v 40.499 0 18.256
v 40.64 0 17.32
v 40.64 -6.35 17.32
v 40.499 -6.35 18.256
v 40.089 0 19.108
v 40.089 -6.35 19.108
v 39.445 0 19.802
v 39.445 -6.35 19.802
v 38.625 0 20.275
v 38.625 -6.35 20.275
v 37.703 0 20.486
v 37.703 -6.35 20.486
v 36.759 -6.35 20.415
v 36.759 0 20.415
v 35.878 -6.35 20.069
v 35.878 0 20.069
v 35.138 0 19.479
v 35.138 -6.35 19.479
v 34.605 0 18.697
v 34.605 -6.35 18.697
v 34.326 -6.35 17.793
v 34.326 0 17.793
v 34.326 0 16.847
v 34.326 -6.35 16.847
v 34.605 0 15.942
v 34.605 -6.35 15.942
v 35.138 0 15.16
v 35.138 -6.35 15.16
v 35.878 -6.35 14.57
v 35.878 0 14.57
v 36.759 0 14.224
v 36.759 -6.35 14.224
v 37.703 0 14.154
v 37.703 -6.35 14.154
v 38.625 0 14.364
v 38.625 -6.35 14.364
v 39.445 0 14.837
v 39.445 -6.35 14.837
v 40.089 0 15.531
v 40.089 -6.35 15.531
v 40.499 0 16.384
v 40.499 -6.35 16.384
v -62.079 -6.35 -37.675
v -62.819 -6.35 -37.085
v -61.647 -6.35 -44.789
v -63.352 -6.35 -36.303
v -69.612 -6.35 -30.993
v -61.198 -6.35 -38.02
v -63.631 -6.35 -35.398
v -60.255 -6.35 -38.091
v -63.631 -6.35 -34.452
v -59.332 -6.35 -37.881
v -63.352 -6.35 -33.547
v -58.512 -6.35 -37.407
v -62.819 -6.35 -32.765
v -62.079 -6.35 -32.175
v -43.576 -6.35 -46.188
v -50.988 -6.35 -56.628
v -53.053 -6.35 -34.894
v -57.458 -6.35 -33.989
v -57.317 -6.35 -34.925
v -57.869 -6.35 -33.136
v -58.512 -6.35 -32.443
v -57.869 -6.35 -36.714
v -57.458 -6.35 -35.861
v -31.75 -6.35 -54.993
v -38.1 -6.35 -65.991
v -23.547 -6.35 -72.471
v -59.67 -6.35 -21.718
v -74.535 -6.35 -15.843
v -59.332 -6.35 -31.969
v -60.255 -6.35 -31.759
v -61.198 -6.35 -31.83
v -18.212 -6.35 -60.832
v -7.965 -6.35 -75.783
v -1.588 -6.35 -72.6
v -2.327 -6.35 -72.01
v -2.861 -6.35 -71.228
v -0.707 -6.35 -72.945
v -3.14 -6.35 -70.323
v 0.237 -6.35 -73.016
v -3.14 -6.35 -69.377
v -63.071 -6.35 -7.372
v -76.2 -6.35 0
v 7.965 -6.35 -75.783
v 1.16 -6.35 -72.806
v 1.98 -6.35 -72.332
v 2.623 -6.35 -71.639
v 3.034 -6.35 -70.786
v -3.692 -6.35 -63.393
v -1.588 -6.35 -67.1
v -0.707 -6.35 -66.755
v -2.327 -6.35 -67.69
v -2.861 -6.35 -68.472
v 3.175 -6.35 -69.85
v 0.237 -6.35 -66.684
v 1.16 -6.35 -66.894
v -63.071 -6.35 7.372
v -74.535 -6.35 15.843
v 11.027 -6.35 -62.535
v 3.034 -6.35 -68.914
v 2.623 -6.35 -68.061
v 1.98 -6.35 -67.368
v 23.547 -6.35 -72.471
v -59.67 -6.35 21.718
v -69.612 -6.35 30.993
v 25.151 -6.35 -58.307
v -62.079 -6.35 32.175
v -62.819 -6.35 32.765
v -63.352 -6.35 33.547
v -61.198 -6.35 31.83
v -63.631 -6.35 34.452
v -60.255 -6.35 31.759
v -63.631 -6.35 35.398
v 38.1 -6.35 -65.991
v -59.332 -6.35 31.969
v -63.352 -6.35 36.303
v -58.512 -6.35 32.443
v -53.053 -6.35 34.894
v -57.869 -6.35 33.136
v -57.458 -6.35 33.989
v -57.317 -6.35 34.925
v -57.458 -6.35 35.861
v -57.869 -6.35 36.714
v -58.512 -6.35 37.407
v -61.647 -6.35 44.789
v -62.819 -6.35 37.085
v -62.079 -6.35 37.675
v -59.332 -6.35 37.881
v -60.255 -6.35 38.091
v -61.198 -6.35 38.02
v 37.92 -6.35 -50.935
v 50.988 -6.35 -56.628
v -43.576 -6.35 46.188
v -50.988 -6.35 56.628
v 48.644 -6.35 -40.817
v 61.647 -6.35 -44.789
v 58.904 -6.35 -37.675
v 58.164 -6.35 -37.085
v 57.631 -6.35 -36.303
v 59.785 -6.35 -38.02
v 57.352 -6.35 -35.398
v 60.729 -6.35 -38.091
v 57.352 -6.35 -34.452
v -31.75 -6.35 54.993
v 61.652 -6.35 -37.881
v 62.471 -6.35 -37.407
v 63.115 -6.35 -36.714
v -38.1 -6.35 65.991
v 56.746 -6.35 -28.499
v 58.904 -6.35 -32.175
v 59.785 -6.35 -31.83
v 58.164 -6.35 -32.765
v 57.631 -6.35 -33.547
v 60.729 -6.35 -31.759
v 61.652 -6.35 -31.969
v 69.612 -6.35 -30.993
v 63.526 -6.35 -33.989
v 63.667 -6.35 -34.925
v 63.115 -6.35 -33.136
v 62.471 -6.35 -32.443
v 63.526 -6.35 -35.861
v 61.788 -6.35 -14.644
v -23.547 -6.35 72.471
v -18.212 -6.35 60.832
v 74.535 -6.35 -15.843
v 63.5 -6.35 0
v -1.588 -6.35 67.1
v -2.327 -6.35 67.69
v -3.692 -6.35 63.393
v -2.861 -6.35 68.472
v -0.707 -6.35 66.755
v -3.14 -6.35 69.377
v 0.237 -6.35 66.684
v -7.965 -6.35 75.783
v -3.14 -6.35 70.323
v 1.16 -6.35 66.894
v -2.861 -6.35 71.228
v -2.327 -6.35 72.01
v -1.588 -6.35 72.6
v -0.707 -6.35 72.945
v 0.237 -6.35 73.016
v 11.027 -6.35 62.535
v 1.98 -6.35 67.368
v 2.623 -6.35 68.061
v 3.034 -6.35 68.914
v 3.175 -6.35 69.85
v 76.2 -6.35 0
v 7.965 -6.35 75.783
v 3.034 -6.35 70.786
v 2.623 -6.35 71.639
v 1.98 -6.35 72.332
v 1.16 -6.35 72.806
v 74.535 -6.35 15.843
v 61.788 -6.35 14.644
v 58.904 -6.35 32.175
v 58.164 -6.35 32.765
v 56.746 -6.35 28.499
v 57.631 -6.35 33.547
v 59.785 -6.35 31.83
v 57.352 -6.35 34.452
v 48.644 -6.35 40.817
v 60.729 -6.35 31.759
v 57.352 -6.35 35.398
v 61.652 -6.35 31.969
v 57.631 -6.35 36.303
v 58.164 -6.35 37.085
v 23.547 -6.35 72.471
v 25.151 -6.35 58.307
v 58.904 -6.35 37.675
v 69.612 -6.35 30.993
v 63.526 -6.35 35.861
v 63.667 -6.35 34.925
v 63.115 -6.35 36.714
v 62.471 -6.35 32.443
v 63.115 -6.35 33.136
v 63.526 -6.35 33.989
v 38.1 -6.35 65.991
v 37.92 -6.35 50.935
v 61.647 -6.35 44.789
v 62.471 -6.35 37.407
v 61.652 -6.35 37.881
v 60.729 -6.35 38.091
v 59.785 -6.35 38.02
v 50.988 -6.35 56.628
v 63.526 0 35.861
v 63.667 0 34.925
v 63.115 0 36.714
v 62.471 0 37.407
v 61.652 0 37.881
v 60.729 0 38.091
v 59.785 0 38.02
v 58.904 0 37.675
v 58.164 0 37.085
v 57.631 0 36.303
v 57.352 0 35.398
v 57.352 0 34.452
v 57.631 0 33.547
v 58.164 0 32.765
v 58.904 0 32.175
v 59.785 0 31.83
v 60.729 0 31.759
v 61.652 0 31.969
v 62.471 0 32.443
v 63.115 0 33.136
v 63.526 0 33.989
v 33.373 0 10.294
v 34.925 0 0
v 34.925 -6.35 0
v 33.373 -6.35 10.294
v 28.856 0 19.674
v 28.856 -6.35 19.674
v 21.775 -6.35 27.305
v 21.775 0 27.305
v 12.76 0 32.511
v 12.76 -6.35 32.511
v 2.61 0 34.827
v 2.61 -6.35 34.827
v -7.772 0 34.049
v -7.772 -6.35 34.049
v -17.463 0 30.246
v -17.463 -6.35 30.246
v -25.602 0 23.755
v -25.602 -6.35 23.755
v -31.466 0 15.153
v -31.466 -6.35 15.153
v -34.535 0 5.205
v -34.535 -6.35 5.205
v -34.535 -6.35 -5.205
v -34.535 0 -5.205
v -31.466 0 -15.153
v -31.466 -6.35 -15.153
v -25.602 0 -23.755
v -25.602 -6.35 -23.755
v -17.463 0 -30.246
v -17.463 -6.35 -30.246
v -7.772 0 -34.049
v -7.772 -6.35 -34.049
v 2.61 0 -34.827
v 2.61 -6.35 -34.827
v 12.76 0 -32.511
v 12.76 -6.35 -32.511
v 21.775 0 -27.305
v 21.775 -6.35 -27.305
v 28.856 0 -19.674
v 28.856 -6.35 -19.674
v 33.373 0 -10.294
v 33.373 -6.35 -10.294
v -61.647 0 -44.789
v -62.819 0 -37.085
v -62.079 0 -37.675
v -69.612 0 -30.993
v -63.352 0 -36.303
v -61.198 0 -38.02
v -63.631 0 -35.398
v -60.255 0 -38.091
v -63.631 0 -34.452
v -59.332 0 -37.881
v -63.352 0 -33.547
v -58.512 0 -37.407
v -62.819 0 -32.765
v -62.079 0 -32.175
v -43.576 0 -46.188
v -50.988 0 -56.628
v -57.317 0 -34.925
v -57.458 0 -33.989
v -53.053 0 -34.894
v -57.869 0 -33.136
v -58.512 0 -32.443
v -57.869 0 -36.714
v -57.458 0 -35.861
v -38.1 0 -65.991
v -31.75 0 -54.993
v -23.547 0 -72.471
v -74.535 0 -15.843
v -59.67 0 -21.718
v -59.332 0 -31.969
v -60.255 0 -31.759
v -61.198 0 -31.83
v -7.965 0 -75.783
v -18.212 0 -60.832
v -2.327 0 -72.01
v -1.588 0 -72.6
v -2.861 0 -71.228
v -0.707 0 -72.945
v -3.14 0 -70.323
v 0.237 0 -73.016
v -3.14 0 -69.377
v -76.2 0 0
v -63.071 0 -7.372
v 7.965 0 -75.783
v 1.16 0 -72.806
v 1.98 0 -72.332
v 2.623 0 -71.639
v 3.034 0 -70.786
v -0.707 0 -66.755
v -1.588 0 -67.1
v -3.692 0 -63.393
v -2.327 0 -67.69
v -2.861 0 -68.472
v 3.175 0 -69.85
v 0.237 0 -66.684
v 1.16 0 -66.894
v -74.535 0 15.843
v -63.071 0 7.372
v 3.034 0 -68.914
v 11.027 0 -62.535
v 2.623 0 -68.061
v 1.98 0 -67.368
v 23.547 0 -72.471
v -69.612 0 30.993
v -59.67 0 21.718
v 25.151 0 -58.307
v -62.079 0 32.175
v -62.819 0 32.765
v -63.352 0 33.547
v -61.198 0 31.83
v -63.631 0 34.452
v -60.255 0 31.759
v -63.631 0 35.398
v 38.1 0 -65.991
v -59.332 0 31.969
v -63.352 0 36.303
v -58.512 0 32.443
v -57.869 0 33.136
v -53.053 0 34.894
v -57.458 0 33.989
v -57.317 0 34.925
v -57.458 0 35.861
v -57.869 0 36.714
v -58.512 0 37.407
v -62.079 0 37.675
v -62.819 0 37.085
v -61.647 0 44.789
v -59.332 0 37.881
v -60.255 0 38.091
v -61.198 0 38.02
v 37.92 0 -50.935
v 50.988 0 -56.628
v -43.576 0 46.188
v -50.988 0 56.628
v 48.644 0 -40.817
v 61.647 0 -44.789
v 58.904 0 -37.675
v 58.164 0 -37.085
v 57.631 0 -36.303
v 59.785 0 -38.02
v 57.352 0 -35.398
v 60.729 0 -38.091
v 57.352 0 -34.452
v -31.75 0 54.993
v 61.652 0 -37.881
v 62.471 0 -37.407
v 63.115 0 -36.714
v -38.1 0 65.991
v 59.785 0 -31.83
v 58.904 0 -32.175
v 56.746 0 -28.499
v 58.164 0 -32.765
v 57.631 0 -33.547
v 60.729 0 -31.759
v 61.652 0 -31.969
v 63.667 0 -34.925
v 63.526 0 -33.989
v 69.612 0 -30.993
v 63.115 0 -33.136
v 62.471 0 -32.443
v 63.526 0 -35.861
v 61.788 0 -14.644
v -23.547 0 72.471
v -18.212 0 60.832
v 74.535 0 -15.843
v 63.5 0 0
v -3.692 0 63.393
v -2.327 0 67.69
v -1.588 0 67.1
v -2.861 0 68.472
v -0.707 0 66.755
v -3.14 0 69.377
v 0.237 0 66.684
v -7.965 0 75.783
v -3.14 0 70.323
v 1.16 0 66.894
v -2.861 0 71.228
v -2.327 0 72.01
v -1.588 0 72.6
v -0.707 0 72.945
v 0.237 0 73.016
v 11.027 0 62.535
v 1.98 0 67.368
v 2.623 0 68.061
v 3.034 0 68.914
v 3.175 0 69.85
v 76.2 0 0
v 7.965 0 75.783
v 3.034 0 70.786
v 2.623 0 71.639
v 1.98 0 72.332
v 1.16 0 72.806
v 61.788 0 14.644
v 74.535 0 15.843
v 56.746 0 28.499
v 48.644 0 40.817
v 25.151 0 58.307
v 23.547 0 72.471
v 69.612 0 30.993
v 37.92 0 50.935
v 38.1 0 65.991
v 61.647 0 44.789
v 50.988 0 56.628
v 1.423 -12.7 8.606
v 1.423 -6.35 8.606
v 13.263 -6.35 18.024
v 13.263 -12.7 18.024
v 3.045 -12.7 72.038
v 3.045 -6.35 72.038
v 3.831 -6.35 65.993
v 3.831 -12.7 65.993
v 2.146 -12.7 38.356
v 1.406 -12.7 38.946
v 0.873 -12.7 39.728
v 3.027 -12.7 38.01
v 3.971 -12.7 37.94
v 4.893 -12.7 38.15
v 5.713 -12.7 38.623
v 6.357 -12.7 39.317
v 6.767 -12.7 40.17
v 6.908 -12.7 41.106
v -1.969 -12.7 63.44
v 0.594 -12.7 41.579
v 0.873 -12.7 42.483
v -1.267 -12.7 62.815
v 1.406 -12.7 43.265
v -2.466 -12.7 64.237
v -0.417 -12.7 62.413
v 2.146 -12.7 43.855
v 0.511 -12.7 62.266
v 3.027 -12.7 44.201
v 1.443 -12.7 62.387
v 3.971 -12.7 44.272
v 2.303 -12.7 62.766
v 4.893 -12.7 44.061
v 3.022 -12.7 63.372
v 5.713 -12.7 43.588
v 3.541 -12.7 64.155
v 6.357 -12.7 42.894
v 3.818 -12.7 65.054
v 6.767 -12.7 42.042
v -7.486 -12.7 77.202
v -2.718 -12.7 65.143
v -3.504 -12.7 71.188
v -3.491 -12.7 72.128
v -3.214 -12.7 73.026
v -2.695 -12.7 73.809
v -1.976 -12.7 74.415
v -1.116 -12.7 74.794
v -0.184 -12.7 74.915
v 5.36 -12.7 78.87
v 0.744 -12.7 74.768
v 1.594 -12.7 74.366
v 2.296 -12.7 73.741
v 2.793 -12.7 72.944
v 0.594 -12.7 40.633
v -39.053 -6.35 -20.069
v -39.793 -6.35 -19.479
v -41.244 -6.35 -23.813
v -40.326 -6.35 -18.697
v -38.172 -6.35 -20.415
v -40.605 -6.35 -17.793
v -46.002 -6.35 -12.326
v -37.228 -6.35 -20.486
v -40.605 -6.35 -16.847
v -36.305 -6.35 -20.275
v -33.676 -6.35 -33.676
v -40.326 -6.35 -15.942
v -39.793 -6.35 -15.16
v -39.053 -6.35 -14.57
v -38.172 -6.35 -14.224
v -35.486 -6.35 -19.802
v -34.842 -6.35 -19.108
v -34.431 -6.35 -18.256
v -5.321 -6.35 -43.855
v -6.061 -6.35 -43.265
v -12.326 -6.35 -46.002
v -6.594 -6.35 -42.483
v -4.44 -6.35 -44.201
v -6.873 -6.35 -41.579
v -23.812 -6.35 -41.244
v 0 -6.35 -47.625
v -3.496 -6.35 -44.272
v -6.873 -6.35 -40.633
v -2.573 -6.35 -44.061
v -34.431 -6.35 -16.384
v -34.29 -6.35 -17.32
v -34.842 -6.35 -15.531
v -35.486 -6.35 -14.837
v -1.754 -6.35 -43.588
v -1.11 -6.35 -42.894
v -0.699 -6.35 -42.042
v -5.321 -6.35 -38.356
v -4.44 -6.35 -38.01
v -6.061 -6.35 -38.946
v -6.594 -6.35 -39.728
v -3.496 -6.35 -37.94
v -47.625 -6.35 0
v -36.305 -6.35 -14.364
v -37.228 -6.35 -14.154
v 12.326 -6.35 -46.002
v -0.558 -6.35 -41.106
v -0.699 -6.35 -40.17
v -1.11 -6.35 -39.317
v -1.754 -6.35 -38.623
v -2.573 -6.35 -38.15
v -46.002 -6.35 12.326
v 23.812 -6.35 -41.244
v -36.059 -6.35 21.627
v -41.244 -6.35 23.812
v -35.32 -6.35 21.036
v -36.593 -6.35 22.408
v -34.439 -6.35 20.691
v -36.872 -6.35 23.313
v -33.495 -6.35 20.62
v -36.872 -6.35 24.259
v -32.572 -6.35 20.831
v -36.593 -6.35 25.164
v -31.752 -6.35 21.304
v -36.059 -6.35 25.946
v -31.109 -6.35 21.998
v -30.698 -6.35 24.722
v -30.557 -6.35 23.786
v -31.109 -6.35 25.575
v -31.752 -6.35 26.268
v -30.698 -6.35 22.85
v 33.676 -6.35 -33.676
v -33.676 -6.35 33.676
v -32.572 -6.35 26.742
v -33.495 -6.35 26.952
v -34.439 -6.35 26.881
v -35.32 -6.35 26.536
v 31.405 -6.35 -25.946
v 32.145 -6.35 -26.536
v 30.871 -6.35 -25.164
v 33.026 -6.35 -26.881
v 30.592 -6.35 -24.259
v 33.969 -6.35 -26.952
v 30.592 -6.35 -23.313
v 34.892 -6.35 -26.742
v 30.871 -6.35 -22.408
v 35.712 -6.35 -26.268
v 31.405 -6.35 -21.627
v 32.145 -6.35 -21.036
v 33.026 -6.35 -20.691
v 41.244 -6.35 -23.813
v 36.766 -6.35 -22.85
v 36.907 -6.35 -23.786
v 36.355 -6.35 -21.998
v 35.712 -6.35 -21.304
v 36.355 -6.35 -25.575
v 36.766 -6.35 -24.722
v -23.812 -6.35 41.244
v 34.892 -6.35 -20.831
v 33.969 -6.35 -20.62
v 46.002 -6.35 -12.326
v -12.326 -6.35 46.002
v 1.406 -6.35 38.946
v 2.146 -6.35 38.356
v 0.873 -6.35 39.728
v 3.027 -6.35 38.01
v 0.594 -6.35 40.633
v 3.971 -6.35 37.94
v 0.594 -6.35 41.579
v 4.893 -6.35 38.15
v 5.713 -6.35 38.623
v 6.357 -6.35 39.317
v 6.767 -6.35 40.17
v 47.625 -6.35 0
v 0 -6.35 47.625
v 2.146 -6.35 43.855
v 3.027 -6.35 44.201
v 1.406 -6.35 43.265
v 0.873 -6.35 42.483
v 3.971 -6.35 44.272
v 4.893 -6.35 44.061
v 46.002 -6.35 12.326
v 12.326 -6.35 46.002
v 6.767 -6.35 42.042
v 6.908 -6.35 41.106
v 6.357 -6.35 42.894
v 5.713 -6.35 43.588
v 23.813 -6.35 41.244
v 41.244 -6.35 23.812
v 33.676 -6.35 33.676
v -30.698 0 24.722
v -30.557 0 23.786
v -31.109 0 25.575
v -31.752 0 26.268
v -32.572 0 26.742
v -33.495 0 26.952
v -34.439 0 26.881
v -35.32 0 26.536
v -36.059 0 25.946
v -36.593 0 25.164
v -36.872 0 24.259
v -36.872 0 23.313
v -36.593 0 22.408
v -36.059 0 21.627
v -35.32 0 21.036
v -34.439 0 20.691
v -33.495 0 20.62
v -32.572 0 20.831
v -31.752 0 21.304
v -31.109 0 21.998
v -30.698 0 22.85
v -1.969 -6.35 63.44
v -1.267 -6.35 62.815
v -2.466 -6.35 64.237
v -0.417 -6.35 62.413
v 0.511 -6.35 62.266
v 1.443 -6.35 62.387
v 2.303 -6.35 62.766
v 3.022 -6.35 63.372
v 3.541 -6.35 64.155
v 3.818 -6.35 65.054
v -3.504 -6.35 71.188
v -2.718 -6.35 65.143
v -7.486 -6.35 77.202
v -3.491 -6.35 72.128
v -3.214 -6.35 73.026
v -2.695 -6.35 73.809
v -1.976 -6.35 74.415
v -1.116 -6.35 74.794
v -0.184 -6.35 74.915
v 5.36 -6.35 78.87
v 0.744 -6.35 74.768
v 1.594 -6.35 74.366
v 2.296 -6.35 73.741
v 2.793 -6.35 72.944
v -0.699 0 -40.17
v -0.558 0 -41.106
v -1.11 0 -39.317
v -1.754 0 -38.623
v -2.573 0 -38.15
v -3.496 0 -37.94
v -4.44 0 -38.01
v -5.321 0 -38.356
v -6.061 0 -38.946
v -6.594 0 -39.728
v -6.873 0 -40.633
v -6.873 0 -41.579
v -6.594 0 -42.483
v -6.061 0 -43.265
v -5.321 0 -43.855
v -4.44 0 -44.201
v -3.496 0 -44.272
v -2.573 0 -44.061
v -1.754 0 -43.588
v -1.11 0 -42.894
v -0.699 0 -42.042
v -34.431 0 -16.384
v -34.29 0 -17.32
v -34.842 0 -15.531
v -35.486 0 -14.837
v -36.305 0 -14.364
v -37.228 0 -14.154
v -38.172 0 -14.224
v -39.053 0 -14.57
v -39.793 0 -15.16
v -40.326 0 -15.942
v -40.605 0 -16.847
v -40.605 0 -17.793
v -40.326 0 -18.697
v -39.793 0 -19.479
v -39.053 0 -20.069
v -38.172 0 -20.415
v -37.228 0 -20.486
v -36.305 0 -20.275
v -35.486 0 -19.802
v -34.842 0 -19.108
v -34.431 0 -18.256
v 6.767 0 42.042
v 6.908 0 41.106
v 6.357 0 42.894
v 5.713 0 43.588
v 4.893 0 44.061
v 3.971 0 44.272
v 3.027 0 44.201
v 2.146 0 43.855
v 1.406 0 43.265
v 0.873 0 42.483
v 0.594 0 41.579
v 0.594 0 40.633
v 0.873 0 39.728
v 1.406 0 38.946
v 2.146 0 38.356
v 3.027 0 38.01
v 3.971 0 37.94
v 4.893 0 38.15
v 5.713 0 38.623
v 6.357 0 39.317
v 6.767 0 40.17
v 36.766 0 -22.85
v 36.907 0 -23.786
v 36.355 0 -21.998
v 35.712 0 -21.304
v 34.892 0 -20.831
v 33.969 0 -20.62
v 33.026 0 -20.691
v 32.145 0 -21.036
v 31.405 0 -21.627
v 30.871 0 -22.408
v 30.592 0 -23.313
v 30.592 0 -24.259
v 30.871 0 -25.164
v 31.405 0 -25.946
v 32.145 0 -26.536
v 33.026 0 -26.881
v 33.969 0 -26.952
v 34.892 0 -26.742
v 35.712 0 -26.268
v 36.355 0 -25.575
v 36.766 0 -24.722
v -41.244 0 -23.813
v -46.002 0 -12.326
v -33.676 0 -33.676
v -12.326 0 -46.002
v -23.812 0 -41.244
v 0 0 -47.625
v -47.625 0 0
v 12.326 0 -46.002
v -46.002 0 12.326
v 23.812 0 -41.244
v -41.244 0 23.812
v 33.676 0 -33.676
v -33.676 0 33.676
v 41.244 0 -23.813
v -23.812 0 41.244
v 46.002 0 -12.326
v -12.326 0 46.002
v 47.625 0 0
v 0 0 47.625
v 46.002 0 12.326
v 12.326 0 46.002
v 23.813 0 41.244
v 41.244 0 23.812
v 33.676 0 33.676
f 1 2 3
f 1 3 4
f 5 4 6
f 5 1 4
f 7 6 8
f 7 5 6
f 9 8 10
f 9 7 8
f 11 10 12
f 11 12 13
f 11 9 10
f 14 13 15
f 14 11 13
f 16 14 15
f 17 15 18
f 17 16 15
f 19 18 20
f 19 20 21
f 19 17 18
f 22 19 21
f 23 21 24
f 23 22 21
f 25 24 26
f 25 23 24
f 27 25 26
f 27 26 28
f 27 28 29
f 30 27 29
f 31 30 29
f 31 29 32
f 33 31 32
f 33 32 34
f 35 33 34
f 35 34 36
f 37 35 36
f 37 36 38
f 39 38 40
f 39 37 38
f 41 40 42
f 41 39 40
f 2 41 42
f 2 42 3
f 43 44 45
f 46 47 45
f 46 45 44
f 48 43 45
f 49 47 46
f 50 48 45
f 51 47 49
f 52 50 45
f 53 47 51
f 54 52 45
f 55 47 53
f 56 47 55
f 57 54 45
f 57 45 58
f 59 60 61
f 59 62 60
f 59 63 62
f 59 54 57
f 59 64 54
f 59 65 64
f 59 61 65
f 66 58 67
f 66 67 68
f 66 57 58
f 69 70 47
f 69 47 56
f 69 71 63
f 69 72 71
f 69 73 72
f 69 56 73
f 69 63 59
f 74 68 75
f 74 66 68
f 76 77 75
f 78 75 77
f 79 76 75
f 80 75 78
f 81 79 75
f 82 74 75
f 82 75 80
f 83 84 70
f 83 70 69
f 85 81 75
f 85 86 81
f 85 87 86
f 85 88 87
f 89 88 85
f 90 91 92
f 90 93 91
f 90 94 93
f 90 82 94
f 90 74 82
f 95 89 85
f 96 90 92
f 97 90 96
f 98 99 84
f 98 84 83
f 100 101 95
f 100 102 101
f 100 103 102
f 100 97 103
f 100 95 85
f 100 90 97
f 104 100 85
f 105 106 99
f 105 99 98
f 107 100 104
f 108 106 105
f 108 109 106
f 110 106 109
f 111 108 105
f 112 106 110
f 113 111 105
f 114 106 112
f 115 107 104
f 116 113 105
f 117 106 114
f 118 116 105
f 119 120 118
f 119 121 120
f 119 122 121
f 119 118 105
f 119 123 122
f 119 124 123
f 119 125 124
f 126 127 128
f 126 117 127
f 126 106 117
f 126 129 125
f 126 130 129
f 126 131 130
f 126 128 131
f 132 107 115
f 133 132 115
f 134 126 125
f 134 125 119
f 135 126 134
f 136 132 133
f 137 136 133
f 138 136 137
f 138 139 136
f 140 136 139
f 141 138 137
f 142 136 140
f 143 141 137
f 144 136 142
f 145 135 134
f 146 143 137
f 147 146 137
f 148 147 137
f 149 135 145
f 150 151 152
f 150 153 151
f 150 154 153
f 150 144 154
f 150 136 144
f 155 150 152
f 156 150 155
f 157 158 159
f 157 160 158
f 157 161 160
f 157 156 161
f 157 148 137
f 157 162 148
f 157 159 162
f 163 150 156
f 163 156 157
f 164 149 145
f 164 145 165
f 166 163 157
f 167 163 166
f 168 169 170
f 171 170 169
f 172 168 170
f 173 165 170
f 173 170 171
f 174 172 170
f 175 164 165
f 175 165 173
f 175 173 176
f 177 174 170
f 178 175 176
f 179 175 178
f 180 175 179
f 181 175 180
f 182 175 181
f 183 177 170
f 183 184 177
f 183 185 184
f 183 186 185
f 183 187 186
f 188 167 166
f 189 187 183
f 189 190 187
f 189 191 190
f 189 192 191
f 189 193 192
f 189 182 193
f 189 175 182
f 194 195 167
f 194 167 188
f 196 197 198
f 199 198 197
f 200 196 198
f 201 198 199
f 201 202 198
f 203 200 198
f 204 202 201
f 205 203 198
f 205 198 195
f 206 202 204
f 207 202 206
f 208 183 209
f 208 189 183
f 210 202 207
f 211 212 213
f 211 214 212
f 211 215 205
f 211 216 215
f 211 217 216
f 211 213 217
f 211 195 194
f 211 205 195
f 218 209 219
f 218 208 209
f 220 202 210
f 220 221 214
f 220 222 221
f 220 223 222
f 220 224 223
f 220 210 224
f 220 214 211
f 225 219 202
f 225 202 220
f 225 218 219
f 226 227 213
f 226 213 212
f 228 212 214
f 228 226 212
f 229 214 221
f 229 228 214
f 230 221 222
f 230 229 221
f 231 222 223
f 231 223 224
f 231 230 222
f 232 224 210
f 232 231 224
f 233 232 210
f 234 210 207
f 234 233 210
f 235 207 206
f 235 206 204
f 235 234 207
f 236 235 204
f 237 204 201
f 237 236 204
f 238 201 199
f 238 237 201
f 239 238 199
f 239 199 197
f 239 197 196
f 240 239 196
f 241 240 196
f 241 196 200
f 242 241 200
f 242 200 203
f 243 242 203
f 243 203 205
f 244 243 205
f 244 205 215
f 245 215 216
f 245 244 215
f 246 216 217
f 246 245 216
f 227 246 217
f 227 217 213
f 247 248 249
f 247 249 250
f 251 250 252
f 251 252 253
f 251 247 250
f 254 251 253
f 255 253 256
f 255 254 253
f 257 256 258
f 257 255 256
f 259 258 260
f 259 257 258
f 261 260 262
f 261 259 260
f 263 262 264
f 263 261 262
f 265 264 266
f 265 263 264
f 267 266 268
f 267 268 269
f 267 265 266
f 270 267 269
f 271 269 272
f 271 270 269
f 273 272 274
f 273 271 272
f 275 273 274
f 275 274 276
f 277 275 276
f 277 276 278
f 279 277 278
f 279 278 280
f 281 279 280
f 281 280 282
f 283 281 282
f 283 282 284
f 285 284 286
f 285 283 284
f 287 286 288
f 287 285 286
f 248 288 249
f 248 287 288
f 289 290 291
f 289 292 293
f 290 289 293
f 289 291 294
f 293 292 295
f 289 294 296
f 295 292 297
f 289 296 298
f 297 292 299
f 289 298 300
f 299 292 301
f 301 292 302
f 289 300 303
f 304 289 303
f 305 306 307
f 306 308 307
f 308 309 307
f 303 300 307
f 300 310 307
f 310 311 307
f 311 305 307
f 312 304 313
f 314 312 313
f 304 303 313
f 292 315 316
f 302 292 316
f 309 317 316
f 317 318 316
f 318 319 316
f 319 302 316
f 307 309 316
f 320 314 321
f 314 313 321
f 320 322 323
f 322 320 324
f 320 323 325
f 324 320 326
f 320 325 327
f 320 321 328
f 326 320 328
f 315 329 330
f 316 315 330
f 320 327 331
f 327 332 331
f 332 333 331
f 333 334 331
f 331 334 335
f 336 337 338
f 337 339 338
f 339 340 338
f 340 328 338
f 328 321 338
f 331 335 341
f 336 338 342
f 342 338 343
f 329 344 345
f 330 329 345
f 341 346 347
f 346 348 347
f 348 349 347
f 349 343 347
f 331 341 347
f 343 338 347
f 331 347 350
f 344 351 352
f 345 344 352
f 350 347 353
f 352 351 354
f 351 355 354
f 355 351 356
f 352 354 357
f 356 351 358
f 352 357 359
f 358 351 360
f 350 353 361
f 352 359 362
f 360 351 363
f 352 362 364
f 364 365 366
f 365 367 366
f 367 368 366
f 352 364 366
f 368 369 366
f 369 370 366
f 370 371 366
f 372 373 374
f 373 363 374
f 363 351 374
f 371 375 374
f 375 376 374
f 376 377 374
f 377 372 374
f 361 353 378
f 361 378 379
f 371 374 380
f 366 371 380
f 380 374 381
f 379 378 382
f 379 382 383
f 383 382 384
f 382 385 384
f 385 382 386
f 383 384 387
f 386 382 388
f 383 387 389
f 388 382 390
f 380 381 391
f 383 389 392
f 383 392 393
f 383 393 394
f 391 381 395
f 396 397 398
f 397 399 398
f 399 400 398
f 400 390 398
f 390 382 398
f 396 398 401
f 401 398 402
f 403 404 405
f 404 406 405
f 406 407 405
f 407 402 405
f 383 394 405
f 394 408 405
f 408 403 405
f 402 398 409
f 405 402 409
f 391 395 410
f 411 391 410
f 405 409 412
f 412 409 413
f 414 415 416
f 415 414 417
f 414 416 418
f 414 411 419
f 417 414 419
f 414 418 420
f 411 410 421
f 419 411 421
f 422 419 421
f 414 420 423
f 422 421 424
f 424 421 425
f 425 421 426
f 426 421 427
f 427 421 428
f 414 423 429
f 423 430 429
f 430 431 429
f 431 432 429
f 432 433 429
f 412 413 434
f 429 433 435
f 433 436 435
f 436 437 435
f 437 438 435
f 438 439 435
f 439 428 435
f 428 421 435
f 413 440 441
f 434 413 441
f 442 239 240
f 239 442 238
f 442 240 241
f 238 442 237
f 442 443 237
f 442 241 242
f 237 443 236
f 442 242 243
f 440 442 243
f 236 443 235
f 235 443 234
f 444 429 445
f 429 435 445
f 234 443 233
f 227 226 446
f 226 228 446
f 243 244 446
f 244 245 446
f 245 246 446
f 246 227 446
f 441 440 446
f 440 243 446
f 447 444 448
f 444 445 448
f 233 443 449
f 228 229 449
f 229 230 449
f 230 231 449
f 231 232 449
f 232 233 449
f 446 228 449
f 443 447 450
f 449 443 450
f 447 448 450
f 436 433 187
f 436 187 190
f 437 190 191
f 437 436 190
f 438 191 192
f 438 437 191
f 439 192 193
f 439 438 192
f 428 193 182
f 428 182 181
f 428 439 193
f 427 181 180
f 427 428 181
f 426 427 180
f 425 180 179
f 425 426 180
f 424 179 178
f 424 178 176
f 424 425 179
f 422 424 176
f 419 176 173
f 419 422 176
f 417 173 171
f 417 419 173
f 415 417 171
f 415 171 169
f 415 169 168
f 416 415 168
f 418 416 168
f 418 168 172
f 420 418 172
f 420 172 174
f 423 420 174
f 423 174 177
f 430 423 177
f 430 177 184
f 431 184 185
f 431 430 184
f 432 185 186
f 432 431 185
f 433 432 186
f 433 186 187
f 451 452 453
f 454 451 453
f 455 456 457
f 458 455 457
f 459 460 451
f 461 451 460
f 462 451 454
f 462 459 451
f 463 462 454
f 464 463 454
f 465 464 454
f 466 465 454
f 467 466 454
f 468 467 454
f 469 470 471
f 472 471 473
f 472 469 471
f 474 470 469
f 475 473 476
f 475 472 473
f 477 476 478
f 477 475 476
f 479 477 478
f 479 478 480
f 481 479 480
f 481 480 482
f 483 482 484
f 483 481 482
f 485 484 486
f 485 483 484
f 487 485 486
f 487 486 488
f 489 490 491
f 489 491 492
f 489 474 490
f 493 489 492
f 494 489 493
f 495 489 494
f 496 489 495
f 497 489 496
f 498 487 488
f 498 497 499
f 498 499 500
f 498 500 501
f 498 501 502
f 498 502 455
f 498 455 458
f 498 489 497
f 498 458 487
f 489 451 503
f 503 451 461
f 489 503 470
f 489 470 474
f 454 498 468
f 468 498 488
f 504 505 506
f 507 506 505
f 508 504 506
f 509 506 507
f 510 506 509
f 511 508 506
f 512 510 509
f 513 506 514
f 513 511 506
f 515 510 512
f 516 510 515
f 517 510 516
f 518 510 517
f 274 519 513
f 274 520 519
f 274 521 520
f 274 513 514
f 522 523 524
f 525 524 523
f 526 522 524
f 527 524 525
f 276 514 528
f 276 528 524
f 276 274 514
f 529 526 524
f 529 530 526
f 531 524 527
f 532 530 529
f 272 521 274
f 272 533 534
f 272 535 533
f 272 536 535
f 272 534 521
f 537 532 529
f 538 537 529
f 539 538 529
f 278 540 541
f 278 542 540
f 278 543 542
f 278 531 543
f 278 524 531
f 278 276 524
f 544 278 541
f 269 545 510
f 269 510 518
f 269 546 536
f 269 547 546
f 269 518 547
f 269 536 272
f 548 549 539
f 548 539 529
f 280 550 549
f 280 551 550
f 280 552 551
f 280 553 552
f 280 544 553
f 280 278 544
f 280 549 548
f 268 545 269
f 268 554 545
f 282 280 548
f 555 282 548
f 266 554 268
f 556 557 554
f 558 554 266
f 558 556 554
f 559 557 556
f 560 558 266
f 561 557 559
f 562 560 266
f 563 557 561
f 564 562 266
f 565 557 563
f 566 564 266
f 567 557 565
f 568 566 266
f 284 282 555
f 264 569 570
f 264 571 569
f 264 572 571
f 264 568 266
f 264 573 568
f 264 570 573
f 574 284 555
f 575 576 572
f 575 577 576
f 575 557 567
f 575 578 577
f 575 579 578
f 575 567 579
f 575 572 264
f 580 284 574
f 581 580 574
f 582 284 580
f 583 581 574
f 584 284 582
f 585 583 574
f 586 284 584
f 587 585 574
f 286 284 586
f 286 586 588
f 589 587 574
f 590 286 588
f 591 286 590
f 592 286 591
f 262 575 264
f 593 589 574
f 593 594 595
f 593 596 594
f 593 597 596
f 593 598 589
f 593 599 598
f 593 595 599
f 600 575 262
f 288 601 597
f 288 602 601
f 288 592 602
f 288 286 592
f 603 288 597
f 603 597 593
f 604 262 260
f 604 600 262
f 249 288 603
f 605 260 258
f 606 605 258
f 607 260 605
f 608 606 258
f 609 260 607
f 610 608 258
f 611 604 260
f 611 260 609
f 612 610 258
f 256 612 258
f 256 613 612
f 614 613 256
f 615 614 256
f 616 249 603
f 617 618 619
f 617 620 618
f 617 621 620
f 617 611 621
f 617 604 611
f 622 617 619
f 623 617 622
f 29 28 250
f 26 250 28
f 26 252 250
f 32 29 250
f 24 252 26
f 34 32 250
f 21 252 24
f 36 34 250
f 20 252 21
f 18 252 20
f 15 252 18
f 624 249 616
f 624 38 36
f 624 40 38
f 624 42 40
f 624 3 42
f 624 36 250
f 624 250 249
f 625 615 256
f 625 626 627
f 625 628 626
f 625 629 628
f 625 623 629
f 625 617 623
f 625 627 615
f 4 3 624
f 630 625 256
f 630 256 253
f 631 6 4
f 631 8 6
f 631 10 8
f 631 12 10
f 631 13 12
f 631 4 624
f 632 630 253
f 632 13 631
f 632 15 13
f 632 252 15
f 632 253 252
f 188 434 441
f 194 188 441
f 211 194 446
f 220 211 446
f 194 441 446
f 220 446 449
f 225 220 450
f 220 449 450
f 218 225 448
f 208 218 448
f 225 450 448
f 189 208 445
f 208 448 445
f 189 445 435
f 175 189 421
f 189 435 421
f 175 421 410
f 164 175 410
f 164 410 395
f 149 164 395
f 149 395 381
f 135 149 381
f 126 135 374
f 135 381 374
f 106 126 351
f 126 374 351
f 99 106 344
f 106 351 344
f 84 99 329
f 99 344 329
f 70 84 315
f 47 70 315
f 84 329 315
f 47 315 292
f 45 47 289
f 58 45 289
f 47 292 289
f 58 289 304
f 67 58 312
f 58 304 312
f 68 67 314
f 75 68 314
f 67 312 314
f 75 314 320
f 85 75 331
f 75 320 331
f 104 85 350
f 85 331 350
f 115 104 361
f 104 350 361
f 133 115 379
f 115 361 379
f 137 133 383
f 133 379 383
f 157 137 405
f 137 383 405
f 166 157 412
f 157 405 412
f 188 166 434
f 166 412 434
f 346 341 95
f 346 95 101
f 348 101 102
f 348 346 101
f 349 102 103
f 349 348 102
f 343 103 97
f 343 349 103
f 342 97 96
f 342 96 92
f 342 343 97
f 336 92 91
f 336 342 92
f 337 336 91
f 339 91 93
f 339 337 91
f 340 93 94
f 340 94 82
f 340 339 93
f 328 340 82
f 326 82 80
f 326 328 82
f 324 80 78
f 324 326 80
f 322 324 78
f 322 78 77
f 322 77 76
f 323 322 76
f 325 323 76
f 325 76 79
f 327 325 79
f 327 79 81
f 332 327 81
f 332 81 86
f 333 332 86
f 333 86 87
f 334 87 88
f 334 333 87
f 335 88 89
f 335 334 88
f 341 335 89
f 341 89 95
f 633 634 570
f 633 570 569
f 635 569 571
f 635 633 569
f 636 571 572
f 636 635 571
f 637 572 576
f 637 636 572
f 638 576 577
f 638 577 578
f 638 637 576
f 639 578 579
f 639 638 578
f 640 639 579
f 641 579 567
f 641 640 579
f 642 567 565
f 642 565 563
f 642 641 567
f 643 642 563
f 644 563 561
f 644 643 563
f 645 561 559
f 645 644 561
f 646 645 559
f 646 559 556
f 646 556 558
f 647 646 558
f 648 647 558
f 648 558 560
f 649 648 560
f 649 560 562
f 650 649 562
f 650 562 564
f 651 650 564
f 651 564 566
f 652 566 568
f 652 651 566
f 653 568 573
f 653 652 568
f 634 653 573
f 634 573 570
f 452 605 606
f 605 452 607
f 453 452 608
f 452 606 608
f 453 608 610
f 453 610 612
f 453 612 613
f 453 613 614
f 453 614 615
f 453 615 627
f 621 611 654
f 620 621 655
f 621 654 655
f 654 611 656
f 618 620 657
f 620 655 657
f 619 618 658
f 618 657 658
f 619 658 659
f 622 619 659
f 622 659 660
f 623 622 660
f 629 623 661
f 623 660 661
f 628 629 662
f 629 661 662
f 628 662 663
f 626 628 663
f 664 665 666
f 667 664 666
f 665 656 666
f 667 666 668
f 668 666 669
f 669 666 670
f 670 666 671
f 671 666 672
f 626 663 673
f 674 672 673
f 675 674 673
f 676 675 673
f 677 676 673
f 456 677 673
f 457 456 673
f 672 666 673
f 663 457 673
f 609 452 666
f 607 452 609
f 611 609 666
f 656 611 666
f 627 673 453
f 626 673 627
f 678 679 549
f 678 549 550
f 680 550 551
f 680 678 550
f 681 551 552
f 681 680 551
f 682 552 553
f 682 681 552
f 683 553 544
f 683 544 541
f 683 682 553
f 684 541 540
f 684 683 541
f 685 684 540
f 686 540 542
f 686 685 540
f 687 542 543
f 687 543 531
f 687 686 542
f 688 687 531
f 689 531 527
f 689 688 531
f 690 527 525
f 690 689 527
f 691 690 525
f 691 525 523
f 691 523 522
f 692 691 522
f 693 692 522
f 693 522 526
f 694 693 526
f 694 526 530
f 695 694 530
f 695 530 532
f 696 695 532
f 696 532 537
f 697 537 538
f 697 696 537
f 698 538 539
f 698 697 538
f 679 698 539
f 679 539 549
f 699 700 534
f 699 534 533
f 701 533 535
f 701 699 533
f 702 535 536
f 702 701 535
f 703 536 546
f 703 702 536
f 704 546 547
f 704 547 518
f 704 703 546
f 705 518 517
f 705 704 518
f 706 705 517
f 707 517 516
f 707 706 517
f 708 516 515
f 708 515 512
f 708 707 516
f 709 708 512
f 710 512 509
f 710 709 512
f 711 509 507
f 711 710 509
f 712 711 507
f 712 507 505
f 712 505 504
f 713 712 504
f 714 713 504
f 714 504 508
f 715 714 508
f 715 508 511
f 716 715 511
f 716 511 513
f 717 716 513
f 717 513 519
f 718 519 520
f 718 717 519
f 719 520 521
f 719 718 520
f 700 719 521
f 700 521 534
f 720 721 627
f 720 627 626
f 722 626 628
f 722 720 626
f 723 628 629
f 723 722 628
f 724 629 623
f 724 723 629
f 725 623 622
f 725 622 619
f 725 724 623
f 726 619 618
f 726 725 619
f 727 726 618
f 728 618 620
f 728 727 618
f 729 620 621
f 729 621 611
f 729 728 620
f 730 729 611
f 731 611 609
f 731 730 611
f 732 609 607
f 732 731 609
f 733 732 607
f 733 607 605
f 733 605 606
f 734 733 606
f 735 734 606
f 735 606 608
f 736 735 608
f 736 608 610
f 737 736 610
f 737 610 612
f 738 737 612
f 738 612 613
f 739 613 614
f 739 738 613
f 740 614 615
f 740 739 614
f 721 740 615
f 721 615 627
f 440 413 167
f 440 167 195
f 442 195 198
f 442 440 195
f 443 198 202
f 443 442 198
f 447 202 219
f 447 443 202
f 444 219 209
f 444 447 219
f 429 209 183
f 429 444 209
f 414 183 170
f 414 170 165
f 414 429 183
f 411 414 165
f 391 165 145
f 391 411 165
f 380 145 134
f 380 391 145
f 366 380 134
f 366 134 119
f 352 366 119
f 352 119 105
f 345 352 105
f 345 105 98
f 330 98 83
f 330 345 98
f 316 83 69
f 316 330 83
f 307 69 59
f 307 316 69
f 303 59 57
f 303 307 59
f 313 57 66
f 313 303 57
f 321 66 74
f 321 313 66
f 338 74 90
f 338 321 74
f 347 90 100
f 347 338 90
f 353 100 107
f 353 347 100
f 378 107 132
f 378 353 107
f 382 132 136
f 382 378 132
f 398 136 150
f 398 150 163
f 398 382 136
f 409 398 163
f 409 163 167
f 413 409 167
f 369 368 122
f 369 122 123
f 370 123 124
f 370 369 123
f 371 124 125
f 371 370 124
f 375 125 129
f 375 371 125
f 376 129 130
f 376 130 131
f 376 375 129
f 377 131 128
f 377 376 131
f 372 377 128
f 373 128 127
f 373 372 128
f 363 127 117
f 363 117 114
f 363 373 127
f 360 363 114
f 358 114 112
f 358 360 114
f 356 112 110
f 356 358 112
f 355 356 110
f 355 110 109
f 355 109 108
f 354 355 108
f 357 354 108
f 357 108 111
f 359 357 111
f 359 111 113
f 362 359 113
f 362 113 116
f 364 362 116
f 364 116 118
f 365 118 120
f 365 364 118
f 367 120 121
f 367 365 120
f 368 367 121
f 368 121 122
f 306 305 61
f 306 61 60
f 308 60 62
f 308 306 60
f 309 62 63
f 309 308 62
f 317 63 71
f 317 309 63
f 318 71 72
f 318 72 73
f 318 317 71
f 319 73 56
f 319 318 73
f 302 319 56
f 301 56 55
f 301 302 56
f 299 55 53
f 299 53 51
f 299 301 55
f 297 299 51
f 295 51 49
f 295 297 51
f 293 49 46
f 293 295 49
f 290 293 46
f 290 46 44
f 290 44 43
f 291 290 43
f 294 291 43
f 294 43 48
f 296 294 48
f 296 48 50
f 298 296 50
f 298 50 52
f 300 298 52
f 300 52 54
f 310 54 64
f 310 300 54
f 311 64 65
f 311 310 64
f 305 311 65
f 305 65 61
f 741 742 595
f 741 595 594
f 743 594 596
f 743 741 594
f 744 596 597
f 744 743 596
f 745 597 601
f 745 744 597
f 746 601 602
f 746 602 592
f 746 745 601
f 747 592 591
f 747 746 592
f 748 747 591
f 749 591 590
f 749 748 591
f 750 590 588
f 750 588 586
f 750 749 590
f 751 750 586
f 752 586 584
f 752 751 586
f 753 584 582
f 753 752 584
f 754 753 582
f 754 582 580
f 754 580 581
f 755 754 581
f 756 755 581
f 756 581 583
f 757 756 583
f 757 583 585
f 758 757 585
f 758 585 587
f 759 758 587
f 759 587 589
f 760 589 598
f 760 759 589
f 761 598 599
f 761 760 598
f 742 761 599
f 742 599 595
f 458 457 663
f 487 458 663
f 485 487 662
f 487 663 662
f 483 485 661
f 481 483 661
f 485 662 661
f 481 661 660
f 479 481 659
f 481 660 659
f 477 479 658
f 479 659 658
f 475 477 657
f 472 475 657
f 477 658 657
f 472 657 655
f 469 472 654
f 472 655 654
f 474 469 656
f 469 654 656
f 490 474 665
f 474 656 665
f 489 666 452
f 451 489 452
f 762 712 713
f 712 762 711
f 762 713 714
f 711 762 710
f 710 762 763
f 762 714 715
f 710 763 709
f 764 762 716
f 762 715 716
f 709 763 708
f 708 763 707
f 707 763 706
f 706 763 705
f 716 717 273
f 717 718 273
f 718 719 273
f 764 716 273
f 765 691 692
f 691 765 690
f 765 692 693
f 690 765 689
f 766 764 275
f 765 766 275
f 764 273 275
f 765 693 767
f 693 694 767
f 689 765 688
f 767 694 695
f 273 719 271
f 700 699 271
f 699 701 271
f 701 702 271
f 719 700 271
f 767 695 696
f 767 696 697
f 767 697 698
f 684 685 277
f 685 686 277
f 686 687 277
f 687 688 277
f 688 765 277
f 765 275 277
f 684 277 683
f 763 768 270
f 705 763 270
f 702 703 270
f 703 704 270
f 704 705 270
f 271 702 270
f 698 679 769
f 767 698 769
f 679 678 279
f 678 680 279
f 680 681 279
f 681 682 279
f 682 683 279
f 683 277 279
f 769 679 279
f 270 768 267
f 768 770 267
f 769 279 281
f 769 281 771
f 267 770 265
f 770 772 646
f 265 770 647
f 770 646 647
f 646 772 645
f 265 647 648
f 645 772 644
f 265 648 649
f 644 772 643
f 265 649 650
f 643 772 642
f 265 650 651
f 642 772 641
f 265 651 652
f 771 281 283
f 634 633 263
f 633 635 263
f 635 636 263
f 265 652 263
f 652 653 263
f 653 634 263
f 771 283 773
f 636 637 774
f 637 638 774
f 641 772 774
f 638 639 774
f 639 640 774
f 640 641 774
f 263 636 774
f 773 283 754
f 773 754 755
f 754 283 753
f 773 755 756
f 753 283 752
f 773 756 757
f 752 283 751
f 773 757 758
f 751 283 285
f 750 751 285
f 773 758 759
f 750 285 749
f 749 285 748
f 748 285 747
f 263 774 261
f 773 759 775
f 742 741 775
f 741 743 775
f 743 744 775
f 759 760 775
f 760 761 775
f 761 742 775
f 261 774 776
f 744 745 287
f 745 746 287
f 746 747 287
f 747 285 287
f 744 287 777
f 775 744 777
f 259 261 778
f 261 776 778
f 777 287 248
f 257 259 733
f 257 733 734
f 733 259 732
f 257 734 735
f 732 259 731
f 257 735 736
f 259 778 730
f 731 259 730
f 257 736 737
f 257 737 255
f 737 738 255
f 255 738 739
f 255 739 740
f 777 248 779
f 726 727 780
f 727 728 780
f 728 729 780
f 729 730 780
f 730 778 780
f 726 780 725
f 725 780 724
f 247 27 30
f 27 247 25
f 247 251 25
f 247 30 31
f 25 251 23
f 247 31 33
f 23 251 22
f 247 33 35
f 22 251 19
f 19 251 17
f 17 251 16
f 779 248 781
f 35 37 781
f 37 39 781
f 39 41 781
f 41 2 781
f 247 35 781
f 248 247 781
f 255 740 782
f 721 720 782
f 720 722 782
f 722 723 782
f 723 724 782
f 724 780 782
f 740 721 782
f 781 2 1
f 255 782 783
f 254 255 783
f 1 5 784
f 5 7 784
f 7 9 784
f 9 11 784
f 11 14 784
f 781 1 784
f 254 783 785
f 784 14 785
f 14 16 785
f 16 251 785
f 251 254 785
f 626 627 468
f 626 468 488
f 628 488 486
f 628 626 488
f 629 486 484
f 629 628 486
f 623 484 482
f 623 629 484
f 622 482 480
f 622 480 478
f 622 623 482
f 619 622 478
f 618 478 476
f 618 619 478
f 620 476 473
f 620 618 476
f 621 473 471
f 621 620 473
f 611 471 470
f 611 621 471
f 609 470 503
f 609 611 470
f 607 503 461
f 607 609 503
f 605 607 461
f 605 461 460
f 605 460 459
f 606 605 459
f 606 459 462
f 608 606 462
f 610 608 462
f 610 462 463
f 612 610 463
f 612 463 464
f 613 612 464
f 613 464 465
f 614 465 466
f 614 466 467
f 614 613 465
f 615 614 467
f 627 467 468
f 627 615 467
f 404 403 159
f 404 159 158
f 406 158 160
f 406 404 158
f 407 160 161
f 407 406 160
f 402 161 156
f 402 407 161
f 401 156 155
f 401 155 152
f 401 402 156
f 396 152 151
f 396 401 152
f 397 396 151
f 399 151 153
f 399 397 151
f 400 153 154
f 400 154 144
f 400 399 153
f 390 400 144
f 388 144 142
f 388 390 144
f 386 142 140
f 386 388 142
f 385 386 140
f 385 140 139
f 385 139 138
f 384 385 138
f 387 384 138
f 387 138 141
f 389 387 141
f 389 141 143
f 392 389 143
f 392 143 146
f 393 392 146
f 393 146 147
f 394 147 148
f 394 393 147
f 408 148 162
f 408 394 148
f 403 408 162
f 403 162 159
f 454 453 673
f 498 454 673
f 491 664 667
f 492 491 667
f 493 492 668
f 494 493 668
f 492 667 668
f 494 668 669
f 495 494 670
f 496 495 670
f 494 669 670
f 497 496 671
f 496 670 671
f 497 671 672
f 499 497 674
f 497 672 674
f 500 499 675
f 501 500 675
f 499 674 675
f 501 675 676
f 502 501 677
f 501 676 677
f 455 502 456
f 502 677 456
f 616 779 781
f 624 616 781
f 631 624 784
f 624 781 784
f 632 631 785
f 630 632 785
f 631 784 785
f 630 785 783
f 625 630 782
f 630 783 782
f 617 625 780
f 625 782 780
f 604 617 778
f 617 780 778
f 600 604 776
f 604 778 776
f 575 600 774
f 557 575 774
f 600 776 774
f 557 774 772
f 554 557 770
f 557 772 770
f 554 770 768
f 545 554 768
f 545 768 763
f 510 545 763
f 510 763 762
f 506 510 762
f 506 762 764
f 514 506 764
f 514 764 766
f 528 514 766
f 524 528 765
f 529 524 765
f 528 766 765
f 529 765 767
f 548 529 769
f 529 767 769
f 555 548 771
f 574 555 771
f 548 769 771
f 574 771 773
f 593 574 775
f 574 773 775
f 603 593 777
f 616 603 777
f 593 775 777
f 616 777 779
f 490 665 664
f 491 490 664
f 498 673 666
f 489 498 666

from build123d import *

# Parameters (mm, degrees)
F0_R     = 76.2
F0_R_2   = 3.175
F0_R_3   = 63.5
F1_DEPTH = 6.35
F2_R     = 47.625
F2_R_2   = 3.175
F2_R_3   = 34.925
F3_DEPTH = 6.35
F4_R     = 3.175
F5_DEPTH = 6.35


with BuildPart() as f1:
    # F0 (on Front) → F1 (new body)
    with BuildSketch(Plane.XZ):
        Circle(F0_R)
        with Locations((-60.491874, -34.925)):
            Circle(F0_R_2, mode=Mode.SUBTRACT)
        with Locations((0, -69.85)):
            Circle(F0_R_2, mode=Mode.SUBTRACT)
        with Locations((60.491874, -34.925)):
            Circle(F0_R_2, mode=Mode.SUBTRACT)
        with Locations((-60.491874, 34.925)):
            Circle(F0_R_2, mode=Mode.SUBTRACT)
        Circle(F0_R_3, mode=Mode.SUBTRACT)
        with Locations((60.491874, 34.925)):
            Circle(F0_R_2, mode=Mode.SUBTRACT)
        with Locations((0, 69.85)):
            Circle(F0_R_2, mode=Mode.SUBTRACT)
    extrude(amount=F1_DEPTH)


with BuildPart() as f3:
    # F2 (on Front) → F3 (new body)
    with BuildSketch(Plane.XZ):
        Circle(F2_R)
        with Locations((-3.733334, -41.105813)):
            Circle(F2_R_2, mode=Mode.SUBTRACT)
        with Locations((-37.465345, -17.319745)):
            Circle(F2_R_2, mode=Mode.SUBTRACT)
        with Locations((33.732011, -23.786068)):
            Circle(F2_R_2, mode=Mode.SUBTRACT)
        with Locations((-33.732011, 23.786068)):
            Circle(F2_R_2, mode=Mode.SUBTRACT)
        Circle(F2_R_3, mode=Mode.SUBTRACT)
        with Locations((37.465345, 17.319745)):
            Circle(F2_R_2, mode=Mode.SUBTRACT)
        with Locations((3.733334, 41.105813)):
            Circle(F2_R_2, mode=Mode.SUBTRACT)
    extrude(amount=F3_DEPTH)


with BuildPart() as f5:
    # F4 (on face) → F5 (new body)
    with BuildSketch(Plane.XZ.offset(6.35)):
        Polygon((5.359811, 78.870476), (-7.486291, 77.202007), (1.423059, 8.605936), (13.262581, 18.024399), align=None)
        with Locations((3.733334, 41.105813)):
            Circle(F4_R, mode=Mode.SUBTRACT)
        with BuildLine():
            ThreePointArc((-3.503502, 71.187894), (-0.654302, 74.887687), (3.045491, 72.038486))
            Line((3.045491, 72.038486), (3.830653, 65.993262))
            ThreePointArc((3.830653, 65.993262), (0.981452, 62.29347), (-2.71834, 65.14267))
            Line((-2.71834, 65.14267), (-3.503502, 71.187894))
        make_face(mode=Mode.SUBTRACT)
    extrude(amount=F5_DEPTH)


solid = Compound([f1.part, f3.part, f5.part])
